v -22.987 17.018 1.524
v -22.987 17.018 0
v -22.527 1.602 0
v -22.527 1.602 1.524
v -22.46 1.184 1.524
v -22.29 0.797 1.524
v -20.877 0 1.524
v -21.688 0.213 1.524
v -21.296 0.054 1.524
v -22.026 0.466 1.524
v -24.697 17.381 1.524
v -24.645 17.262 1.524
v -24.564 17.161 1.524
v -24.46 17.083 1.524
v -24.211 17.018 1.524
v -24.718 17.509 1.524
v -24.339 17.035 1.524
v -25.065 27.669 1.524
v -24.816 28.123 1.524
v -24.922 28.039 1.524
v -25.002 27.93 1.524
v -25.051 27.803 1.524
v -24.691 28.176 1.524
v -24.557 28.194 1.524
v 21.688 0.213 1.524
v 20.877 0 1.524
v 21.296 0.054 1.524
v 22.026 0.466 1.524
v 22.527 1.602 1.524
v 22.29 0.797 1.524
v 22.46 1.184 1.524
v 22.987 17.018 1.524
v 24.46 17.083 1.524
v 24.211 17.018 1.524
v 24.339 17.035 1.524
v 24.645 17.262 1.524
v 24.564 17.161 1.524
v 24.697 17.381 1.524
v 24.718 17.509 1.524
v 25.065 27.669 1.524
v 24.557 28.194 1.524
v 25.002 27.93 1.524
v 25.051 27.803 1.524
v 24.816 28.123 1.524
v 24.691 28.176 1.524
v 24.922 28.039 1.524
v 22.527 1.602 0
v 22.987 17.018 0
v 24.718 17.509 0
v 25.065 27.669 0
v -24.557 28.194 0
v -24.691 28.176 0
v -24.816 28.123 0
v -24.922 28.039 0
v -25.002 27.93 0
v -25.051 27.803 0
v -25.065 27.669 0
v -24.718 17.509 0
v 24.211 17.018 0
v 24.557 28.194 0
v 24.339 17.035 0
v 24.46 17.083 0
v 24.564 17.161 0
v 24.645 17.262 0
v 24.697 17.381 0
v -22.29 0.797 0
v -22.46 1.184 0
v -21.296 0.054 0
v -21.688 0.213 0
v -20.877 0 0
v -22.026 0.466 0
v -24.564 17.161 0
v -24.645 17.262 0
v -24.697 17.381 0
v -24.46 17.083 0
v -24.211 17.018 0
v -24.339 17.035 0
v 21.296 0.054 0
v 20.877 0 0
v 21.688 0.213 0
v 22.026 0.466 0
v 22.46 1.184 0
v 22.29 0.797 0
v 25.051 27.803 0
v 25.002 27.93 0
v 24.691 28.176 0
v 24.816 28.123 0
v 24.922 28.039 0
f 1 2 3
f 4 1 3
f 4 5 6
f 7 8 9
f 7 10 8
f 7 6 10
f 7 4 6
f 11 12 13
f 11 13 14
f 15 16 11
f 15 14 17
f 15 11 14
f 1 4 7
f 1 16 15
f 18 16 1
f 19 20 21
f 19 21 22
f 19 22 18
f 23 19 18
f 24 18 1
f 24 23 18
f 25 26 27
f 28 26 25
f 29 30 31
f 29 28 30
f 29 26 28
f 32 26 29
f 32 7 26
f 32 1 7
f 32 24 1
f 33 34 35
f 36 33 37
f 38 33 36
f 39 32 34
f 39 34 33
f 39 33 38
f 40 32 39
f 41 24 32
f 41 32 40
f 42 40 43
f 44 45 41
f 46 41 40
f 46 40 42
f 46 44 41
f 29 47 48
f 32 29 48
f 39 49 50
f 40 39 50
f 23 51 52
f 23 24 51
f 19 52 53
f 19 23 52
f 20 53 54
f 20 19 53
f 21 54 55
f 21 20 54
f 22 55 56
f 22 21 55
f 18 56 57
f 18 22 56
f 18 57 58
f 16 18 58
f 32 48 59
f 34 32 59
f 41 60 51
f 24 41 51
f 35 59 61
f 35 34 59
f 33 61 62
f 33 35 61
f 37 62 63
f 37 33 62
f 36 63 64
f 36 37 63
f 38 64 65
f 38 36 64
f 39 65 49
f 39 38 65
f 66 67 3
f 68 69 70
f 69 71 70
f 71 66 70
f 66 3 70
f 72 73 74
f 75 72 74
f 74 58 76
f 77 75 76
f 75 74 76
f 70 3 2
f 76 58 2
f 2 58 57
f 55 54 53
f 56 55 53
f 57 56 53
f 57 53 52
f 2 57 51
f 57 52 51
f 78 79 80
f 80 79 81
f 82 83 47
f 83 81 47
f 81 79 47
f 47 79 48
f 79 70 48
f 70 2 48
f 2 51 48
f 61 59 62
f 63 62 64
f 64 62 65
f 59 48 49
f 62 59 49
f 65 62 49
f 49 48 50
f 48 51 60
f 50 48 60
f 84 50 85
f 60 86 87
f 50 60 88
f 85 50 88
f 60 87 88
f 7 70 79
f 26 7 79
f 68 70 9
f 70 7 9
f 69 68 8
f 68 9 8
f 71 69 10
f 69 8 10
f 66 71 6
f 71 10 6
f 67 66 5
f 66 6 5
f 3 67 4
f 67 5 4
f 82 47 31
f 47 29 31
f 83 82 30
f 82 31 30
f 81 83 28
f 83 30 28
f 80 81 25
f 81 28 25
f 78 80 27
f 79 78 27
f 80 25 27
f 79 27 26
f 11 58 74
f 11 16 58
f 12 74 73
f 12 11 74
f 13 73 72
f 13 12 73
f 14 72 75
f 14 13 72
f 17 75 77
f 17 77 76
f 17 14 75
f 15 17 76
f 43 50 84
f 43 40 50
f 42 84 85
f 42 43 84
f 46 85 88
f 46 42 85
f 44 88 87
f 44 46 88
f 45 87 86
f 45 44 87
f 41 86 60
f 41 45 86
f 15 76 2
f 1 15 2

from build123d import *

# Parameters (mm, degrees)
F1_DEPTH = 1.524
F2_R     = 0.508
F3_R     = 1.651


with BuildPart() as f1:
    # F0 (on Top) → F1 (new body)
    with BuildSketch(Plane.XY):
        Polygon((-22.987, 17.018), (-22.479, 0), (22.479, 0), (22.987, 17.018), (24.7015, 17.018), (25.0825, 28.194), (-25.0825, 28.194), (-24.7015, 17.018), align=None)
    extrude(amount=F1_DEPTH)

    # F2
    f2_edges = [f1.edges().sort_by_distance(p)[0] for p in [
        (25.0825, 28.194, 0.762),
        (24.7015, 17.018, 0.762),
        (-25.0825, 28.194, 0.762),
        (-24.7015, 17.018, 0.762),
    ]]
    fillet(f2_edges, radius=F2_R)

    # F3
    f3_edges = [f1.edges().sort_by_distance(p)[0] for p in [
        (-22.479, 0, 0.762),
        (22.479, 0, 0.762),
    ]]
    fillet(f3_edges, radius=F3_R)


solid = f1.part
